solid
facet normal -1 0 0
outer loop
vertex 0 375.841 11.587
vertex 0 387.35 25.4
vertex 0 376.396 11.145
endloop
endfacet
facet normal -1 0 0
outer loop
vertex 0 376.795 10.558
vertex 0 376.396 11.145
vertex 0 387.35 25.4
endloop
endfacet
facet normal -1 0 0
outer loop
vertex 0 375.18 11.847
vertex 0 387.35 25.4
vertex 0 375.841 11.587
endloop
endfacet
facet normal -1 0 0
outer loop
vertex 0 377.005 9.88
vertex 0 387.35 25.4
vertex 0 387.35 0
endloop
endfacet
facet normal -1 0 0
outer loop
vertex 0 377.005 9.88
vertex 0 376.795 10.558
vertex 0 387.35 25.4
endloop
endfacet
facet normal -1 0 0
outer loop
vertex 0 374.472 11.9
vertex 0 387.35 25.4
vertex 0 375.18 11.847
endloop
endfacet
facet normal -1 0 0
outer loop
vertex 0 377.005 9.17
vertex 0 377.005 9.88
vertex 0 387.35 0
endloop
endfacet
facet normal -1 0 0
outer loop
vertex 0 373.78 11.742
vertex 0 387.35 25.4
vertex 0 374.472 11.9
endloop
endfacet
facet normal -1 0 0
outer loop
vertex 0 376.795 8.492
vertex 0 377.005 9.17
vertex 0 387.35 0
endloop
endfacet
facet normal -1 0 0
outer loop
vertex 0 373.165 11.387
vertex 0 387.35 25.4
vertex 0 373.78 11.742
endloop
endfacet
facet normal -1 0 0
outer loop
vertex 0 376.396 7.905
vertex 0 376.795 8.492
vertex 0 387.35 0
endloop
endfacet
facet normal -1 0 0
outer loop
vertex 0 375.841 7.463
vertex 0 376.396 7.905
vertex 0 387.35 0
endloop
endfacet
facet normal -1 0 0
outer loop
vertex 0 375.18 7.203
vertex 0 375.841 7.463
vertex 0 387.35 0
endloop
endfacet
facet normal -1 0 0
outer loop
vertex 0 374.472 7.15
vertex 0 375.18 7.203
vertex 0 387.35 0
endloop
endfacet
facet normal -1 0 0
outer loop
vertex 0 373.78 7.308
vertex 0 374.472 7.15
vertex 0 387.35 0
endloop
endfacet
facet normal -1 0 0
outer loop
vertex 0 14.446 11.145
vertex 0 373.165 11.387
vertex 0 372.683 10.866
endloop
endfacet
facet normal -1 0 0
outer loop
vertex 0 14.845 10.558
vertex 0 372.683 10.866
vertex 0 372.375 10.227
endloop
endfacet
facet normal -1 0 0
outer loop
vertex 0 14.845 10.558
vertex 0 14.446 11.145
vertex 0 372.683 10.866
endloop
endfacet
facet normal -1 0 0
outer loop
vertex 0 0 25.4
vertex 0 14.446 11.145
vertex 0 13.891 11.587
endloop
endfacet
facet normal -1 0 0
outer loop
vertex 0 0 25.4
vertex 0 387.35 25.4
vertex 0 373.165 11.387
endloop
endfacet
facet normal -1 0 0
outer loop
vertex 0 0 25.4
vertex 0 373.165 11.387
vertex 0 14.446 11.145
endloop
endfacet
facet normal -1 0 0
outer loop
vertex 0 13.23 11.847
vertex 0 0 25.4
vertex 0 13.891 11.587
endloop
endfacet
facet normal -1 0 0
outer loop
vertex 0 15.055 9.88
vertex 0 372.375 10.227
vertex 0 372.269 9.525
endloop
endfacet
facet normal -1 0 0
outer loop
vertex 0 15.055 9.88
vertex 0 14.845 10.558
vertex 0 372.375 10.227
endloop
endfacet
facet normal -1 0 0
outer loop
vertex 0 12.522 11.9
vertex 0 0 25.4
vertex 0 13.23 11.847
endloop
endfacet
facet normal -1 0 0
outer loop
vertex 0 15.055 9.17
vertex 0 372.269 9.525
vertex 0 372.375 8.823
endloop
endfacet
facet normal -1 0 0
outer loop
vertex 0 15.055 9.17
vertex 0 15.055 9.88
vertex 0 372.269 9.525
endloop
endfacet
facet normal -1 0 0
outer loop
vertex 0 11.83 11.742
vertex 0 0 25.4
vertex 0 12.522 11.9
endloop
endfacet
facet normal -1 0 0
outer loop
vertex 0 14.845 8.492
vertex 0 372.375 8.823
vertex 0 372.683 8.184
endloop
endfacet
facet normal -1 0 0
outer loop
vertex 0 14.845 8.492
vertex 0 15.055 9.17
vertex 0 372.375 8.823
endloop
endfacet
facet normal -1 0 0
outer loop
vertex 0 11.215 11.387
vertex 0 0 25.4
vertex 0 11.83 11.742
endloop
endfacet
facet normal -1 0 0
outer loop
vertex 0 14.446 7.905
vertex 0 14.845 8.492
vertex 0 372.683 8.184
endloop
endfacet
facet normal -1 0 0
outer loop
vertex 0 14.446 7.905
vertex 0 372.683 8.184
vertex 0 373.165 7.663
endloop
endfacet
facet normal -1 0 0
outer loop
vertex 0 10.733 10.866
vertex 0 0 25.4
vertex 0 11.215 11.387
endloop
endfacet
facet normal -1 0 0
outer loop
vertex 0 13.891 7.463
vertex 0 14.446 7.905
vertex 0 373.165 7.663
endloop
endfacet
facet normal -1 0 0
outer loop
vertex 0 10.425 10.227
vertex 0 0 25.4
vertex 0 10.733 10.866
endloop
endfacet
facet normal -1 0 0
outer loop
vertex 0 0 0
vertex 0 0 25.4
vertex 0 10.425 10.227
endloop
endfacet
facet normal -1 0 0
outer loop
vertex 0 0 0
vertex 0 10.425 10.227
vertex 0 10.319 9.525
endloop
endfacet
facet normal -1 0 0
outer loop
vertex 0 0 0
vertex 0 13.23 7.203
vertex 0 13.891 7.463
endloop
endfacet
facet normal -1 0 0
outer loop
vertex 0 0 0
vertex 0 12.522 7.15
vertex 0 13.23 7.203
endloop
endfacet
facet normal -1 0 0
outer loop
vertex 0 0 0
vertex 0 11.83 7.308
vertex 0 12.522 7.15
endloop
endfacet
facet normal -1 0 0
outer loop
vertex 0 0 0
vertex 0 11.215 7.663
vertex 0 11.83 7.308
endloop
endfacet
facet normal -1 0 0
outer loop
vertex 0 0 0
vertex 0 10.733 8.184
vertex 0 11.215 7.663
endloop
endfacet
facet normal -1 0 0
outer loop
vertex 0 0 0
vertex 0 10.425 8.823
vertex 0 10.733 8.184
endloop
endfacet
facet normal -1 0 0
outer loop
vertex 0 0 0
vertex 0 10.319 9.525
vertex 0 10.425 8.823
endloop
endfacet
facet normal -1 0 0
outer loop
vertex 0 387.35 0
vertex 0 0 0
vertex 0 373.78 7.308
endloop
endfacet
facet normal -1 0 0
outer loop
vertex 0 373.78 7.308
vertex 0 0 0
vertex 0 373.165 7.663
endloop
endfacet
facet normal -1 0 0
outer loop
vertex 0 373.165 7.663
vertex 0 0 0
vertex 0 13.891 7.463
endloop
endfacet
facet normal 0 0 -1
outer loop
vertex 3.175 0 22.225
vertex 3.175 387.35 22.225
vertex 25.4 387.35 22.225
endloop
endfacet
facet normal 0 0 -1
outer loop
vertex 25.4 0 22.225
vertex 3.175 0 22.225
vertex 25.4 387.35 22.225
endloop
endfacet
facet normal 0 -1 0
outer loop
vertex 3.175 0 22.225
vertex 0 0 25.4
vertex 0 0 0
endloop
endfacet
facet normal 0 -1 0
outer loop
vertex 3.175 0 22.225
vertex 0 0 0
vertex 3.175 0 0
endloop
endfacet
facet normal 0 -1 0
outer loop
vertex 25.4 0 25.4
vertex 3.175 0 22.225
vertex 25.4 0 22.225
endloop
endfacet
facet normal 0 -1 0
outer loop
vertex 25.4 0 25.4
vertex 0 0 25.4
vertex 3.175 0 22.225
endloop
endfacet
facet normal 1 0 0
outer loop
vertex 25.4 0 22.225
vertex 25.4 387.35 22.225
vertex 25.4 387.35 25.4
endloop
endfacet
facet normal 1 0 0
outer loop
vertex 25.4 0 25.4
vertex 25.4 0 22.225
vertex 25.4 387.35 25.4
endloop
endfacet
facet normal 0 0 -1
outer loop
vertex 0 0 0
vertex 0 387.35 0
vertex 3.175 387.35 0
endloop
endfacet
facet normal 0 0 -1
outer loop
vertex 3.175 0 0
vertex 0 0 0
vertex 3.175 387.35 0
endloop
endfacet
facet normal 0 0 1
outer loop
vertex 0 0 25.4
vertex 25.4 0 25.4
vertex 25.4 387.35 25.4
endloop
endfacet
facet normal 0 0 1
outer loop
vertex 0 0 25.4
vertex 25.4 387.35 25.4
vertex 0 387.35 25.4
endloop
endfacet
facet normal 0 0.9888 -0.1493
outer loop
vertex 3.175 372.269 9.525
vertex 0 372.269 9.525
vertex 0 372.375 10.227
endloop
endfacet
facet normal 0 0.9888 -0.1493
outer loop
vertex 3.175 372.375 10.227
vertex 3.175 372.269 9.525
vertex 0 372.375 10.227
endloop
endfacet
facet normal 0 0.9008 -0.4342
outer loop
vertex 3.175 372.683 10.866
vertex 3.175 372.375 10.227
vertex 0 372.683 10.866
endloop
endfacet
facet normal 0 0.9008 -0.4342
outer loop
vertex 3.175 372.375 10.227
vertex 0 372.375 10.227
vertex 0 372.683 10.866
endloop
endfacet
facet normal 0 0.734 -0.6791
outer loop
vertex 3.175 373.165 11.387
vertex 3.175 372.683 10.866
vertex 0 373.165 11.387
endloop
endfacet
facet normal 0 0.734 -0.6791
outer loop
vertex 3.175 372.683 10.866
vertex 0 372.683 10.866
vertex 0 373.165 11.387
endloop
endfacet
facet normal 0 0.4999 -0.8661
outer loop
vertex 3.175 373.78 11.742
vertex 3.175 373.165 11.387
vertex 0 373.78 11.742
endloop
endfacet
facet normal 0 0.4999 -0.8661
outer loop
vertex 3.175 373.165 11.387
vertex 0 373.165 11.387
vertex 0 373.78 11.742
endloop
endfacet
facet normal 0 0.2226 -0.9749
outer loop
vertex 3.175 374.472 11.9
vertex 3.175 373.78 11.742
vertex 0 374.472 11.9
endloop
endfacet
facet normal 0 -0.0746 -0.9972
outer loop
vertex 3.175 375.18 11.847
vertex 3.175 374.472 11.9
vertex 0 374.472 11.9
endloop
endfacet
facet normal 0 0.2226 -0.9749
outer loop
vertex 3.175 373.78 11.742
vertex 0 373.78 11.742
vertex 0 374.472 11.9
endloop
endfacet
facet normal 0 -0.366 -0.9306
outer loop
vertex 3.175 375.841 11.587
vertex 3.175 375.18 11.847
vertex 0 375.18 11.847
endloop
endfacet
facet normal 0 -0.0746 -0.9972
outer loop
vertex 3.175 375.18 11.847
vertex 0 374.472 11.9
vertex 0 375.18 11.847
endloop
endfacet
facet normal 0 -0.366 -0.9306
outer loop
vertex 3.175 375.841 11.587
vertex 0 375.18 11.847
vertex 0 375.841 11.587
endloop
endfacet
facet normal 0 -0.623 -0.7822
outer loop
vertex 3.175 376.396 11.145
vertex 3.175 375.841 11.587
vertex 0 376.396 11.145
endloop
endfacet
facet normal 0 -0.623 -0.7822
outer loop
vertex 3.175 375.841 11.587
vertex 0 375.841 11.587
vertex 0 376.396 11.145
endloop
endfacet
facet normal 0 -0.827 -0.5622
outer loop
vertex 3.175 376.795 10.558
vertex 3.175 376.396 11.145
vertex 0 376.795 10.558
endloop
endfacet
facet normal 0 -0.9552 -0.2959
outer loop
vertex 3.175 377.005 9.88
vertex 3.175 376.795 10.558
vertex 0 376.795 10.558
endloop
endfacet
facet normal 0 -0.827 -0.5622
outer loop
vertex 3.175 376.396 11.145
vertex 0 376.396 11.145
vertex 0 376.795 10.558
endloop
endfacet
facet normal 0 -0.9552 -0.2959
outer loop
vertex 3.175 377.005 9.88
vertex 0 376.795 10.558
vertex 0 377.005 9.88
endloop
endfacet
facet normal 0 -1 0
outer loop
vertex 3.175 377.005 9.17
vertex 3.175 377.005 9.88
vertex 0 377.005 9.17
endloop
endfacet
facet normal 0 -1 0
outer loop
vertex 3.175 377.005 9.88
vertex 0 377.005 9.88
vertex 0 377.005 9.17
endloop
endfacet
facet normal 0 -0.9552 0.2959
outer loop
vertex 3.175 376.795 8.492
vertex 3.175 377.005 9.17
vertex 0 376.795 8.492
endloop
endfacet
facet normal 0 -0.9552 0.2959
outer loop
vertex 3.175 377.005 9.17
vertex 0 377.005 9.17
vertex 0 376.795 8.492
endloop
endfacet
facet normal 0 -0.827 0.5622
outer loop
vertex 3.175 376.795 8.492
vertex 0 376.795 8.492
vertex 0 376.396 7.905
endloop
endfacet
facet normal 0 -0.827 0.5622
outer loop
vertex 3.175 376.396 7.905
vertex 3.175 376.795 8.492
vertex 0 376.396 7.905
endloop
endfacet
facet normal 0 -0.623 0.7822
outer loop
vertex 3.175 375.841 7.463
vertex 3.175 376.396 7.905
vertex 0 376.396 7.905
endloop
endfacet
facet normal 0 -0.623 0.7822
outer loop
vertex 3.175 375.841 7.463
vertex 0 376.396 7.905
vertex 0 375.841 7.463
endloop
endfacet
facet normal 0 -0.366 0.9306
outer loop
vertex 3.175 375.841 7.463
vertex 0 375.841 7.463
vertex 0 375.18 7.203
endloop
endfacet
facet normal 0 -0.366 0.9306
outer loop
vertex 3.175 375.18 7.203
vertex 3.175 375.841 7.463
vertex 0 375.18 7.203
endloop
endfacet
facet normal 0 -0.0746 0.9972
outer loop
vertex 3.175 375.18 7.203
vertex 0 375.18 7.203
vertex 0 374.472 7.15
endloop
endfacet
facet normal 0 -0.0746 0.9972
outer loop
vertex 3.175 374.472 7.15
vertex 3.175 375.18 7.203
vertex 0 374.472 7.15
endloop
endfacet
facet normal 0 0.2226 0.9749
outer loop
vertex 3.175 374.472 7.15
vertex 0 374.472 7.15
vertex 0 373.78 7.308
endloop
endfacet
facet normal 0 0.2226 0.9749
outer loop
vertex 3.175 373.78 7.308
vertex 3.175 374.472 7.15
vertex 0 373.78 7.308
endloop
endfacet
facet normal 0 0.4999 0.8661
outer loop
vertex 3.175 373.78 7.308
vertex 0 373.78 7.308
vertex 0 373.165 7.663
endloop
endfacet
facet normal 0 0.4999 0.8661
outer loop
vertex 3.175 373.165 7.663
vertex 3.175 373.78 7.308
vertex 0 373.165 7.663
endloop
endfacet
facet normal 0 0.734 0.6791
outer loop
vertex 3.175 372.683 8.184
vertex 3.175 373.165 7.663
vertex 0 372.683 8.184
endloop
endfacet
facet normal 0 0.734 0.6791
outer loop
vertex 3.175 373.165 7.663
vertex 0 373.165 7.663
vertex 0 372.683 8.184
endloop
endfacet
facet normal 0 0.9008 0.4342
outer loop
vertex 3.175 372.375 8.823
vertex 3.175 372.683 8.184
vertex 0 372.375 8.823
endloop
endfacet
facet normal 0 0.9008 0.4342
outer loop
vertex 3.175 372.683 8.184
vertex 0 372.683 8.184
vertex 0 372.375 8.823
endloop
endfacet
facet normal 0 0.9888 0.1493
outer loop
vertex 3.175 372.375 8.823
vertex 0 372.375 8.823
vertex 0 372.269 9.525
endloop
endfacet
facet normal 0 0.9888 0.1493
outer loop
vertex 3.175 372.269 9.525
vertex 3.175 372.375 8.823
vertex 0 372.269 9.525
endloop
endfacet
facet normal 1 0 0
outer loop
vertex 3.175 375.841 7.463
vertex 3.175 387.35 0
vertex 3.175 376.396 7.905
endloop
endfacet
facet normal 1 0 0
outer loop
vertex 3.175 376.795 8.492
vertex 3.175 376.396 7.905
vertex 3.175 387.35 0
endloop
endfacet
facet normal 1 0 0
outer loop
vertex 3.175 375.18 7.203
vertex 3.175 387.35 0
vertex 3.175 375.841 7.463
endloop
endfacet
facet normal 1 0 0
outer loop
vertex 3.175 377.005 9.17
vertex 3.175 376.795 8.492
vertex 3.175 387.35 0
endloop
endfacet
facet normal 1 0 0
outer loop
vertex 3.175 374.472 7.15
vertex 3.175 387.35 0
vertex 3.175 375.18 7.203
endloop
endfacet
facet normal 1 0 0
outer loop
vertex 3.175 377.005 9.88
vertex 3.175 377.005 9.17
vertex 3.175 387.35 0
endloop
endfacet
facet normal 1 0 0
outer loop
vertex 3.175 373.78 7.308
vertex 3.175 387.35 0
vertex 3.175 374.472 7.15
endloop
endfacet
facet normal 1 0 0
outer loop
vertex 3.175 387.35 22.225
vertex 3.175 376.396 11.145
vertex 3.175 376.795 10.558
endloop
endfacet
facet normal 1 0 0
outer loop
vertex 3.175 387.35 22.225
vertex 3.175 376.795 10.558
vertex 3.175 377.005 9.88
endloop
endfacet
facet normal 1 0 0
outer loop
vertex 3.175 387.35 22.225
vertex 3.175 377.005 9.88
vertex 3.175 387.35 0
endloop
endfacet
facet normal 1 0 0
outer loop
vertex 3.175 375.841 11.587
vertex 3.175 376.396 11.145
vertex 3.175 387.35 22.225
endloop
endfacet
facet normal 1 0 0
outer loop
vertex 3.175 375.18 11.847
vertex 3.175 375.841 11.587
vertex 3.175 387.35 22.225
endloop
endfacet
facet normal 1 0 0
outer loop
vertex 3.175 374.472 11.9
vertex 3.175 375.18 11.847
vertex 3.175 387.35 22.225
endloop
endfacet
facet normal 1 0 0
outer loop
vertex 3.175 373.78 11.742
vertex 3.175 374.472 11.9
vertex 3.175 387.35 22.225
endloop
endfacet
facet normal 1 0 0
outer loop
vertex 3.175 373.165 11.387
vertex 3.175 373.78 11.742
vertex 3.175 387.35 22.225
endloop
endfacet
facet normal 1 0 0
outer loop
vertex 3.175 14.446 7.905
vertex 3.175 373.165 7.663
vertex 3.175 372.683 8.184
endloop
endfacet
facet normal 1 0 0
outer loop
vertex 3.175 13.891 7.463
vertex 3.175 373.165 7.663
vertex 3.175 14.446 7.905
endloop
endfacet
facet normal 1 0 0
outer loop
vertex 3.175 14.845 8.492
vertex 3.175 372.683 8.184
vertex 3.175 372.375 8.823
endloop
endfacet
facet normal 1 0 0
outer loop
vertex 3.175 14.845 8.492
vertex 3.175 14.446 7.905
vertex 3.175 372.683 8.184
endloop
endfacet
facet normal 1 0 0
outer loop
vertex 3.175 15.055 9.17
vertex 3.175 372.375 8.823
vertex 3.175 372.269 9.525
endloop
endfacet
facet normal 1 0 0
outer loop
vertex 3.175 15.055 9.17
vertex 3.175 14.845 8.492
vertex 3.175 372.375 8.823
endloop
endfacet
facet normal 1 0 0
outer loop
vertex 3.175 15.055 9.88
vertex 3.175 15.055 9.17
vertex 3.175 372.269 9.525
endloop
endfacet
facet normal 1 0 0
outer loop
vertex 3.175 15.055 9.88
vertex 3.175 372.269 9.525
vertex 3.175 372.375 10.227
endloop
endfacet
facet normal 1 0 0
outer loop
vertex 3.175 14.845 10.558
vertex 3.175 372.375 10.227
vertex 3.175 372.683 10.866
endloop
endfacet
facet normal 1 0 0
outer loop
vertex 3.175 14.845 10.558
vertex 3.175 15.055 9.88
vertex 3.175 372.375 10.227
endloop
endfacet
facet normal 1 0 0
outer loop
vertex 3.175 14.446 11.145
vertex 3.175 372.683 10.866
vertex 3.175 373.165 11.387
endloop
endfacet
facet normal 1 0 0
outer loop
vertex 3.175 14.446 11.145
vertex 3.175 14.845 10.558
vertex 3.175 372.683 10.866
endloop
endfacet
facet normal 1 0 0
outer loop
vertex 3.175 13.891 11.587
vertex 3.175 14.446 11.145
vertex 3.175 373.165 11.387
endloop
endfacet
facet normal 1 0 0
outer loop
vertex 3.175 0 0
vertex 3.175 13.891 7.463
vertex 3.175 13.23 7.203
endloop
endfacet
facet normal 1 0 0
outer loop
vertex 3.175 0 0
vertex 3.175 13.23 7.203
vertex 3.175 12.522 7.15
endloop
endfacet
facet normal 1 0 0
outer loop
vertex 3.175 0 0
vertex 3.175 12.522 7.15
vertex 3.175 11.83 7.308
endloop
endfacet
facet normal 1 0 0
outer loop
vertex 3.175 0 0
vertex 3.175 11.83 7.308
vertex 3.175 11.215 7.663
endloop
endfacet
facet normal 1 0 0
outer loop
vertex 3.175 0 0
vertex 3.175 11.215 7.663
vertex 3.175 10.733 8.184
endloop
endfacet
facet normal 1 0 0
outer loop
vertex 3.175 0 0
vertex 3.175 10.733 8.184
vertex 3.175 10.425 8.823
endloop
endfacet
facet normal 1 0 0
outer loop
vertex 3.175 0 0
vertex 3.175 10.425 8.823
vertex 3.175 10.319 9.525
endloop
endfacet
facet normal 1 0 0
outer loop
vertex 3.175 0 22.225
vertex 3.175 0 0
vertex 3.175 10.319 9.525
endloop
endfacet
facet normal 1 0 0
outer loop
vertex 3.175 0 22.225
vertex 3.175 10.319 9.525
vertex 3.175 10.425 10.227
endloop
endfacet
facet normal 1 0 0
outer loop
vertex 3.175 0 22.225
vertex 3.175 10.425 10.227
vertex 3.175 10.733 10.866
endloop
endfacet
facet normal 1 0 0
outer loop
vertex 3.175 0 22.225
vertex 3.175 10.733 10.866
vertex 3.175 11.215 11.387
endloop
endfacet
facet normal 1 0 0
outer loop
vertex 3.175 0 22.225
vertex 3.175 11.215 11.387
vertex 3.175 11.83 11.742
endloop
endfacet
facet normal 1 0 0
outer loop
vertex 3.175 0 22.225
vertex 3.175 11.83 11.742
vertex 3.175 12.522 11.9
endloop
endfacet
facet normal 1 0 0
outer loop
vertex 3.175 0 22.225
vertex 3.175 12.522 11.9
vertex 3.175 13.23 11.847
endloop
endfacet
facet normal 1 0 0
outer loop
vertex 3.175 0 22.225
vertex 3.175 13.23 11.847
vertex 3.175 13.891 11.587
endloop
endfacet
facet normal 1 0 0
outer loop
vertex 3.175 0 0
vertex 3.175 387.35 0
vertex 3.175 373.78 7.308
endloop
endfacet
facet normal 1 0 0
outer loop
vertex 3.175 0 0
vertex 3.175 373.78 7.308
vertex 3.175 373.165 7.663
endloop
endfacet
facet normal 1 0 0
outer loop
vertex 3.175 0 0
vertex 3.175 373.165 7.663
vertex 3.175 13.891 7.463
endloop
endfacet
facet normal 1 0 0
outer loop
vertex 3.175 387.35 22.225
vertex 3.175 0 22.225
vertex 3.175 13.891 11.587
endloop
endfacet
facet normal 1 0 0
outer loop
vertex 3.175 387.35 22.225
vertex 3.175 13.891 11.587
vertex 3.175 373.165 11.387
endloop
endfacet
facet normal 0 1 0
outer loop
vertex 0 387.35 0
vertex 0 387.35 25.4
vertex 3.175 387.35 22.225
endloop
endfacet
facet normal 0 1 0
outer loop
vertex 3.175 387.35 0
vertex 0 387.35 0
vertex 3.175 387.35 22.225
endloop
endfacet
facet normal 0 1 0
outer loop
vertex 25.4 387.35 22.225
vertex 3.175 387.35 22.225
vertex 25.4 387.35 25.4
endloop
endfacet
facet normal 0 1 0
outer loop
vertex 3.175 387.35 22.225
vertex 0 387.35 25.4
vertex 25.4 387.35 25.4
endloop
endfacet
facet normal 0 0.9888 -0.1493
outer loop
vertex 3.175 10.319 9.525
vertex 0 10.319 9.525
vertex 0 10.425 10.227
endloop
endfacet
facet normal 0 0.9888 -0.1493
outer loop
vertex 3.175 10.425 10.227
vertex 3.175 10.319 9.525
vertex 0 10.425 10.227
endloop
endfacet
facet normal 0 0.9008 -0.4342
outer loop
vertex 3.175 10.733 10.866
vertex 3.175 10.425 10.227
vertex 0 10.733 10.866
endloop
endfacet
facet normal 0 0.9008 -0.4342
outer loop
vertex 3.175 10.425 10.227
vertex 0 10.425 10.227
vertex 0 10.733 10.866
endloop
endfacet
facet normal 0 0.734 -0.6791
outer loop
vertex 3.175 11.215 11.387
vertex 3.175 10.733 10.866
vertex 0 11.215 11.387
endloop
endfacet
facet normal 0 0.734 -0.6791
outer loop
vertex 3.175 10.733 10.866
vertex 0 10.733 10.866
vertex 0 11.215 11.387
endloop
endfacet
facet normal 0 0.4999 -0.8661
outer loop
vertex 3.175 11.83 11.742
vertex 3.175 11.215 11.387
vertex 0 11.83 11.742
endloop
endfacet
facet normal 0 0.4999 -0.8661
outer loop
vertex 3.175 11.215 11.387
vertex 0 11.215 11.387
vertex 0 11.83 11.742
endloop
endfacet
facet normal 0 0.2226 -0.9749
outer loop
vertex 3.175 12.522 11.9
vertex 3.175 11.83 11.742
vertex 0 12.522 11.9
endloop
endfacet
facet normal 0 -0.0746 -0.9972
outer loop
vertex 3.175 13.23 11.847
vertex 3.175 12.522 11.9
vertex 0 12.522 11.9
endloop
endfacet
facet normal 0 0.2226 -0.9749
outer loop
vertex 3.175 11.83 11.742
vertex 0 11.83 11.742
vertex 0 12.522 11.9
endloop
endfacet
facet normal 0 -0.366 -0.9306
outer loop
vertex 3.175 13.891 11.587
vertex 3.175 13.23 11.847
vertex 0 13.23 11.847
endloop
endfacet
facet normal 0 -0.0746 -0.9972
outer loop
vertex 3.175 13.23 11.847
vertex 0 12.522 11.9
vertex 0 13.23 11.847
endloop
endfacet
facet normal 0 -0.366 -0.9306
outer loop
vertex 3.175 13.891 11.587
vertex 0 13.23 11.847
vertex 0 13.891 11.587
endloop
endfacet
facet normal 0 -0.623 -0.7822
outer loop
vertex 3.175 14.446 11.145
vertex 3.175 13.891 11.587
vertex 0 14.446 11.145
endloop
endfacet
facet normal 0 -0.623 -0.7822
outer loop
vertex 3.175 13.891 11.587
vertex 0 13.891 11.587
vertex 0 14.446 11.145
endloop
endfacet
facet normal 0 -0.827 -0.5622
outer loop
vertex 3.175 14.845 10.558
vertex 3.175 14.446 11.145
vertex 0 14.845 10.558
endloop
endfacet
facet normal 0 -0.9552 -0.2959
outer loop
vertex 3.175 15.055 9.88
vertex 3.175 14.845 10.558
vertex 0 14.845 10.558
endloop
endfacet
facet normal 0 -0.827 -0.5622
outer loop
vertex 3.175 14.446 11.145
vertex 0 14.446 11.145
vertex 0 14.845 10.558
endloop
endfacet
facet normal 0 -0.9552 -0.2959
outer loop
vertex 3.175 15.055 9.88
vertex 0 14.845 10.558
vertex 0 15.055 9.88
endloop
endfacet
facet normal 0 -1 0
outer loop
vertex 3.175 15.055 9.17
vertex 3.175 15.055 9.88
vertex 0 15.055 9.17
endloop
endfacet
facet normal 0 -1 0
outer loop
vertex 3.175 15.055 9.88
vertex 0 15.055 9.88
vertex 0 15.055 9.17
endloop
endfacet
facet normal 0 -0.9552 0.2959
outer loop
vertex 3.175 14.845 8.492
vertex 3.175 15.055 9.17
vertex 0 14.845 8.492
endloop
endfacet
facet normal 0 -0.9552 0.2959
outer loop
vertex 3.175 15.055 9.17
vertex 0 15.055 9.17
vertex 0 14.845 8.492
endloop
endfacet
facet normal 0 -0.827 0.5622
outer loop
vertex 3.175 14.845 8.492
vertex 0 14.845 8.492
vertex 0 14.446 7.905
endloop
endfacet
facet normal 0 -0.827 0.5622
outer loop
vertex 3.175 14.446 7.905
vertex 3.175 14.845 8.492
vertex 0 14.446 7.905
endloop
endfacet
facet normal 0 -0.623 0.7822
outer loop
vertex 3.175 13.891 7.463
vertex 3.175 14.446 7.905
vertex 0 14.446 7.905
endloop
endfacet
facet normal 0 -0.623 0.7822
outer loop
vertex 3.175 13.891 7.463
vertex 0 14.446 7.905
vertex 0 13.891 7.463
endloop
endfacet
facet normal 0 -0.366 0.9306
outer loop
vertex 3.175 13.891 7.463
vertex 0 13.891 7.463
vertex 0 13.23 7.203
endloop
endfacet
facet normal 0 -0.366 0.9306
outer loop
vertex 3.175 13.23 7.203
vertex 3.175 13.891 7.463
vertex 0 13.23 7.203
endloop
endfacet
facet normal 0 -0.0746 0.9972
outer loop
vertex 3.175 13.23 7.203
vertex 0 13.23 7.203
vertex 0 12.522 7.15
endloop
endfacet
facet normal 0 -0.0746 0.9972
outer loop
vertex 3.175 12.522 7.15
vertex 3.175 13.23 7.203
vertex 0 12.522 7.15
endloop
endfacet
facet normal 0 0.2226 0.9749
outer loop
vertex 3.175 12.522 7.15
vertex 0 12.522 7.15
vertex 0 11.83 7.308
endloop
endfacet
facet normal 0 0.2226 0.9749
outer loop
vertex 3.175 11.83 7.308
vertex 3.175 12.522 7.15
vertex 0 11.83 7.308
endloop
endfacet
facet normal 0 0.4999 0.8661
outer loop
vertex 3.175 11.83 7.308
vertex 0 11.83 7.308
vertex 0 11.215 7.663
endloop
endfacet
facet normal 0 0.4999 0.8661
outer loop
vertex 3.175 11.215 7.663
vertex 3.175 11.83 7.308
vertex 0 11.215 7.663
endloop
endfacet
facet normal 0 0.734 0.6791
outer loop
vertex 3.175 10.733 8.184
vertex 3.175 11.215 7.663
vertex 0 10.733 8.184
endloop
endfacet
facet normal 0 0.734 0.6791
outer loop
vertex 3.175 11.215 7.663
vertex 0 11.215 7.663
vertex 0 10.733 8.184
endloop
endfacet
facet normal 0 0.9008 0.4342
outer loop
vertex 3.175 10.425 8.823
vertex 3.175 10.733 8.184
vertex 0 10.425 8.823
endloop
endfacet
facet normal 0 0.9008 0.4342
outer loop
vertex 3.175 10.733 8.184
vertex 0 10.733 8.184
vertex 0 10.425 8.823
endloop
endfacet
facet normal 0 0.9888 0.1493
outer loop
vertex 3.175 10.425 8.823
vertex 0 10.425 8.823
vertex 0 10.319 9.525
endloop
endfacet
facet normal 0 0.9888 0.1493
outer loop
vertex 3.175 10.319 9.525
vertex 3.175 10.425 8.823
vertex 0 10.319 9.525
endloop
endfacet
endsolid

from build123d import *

# Parameters (mm, degrees)
F1_DEPTH = 387.35
F2_R     = 2.38125
F3_DEPTH = 3.175


with BuildPart() as f1:
    # F0 (on Front) → F1 (new body)
    with BuildSketch(Plane.XZ):
        Polygon((0, 25.4), (0, 0), (3.175, 0), (3.175, 22.225), (25.4, 22.225), (25.4, 25.4), align=None)
    extrude(amount=-F1_DEPTH)

    # F2 (on face) → F3 (cut)
    with BuildSketch(Plane(origin=(0, 0, 0), x_dir=(0, -1, 0), z_dir=(-1, 0, 0))):
        with Locations((-12.7, 9.525)):
            Circle(F2_R)
        with Locations((-374.65, 9.525)):
            Circle(F2_R)
    extrude(amount=-F3_DEPTH, mode=Mode.SUBTRACT)


solid = f1.part
